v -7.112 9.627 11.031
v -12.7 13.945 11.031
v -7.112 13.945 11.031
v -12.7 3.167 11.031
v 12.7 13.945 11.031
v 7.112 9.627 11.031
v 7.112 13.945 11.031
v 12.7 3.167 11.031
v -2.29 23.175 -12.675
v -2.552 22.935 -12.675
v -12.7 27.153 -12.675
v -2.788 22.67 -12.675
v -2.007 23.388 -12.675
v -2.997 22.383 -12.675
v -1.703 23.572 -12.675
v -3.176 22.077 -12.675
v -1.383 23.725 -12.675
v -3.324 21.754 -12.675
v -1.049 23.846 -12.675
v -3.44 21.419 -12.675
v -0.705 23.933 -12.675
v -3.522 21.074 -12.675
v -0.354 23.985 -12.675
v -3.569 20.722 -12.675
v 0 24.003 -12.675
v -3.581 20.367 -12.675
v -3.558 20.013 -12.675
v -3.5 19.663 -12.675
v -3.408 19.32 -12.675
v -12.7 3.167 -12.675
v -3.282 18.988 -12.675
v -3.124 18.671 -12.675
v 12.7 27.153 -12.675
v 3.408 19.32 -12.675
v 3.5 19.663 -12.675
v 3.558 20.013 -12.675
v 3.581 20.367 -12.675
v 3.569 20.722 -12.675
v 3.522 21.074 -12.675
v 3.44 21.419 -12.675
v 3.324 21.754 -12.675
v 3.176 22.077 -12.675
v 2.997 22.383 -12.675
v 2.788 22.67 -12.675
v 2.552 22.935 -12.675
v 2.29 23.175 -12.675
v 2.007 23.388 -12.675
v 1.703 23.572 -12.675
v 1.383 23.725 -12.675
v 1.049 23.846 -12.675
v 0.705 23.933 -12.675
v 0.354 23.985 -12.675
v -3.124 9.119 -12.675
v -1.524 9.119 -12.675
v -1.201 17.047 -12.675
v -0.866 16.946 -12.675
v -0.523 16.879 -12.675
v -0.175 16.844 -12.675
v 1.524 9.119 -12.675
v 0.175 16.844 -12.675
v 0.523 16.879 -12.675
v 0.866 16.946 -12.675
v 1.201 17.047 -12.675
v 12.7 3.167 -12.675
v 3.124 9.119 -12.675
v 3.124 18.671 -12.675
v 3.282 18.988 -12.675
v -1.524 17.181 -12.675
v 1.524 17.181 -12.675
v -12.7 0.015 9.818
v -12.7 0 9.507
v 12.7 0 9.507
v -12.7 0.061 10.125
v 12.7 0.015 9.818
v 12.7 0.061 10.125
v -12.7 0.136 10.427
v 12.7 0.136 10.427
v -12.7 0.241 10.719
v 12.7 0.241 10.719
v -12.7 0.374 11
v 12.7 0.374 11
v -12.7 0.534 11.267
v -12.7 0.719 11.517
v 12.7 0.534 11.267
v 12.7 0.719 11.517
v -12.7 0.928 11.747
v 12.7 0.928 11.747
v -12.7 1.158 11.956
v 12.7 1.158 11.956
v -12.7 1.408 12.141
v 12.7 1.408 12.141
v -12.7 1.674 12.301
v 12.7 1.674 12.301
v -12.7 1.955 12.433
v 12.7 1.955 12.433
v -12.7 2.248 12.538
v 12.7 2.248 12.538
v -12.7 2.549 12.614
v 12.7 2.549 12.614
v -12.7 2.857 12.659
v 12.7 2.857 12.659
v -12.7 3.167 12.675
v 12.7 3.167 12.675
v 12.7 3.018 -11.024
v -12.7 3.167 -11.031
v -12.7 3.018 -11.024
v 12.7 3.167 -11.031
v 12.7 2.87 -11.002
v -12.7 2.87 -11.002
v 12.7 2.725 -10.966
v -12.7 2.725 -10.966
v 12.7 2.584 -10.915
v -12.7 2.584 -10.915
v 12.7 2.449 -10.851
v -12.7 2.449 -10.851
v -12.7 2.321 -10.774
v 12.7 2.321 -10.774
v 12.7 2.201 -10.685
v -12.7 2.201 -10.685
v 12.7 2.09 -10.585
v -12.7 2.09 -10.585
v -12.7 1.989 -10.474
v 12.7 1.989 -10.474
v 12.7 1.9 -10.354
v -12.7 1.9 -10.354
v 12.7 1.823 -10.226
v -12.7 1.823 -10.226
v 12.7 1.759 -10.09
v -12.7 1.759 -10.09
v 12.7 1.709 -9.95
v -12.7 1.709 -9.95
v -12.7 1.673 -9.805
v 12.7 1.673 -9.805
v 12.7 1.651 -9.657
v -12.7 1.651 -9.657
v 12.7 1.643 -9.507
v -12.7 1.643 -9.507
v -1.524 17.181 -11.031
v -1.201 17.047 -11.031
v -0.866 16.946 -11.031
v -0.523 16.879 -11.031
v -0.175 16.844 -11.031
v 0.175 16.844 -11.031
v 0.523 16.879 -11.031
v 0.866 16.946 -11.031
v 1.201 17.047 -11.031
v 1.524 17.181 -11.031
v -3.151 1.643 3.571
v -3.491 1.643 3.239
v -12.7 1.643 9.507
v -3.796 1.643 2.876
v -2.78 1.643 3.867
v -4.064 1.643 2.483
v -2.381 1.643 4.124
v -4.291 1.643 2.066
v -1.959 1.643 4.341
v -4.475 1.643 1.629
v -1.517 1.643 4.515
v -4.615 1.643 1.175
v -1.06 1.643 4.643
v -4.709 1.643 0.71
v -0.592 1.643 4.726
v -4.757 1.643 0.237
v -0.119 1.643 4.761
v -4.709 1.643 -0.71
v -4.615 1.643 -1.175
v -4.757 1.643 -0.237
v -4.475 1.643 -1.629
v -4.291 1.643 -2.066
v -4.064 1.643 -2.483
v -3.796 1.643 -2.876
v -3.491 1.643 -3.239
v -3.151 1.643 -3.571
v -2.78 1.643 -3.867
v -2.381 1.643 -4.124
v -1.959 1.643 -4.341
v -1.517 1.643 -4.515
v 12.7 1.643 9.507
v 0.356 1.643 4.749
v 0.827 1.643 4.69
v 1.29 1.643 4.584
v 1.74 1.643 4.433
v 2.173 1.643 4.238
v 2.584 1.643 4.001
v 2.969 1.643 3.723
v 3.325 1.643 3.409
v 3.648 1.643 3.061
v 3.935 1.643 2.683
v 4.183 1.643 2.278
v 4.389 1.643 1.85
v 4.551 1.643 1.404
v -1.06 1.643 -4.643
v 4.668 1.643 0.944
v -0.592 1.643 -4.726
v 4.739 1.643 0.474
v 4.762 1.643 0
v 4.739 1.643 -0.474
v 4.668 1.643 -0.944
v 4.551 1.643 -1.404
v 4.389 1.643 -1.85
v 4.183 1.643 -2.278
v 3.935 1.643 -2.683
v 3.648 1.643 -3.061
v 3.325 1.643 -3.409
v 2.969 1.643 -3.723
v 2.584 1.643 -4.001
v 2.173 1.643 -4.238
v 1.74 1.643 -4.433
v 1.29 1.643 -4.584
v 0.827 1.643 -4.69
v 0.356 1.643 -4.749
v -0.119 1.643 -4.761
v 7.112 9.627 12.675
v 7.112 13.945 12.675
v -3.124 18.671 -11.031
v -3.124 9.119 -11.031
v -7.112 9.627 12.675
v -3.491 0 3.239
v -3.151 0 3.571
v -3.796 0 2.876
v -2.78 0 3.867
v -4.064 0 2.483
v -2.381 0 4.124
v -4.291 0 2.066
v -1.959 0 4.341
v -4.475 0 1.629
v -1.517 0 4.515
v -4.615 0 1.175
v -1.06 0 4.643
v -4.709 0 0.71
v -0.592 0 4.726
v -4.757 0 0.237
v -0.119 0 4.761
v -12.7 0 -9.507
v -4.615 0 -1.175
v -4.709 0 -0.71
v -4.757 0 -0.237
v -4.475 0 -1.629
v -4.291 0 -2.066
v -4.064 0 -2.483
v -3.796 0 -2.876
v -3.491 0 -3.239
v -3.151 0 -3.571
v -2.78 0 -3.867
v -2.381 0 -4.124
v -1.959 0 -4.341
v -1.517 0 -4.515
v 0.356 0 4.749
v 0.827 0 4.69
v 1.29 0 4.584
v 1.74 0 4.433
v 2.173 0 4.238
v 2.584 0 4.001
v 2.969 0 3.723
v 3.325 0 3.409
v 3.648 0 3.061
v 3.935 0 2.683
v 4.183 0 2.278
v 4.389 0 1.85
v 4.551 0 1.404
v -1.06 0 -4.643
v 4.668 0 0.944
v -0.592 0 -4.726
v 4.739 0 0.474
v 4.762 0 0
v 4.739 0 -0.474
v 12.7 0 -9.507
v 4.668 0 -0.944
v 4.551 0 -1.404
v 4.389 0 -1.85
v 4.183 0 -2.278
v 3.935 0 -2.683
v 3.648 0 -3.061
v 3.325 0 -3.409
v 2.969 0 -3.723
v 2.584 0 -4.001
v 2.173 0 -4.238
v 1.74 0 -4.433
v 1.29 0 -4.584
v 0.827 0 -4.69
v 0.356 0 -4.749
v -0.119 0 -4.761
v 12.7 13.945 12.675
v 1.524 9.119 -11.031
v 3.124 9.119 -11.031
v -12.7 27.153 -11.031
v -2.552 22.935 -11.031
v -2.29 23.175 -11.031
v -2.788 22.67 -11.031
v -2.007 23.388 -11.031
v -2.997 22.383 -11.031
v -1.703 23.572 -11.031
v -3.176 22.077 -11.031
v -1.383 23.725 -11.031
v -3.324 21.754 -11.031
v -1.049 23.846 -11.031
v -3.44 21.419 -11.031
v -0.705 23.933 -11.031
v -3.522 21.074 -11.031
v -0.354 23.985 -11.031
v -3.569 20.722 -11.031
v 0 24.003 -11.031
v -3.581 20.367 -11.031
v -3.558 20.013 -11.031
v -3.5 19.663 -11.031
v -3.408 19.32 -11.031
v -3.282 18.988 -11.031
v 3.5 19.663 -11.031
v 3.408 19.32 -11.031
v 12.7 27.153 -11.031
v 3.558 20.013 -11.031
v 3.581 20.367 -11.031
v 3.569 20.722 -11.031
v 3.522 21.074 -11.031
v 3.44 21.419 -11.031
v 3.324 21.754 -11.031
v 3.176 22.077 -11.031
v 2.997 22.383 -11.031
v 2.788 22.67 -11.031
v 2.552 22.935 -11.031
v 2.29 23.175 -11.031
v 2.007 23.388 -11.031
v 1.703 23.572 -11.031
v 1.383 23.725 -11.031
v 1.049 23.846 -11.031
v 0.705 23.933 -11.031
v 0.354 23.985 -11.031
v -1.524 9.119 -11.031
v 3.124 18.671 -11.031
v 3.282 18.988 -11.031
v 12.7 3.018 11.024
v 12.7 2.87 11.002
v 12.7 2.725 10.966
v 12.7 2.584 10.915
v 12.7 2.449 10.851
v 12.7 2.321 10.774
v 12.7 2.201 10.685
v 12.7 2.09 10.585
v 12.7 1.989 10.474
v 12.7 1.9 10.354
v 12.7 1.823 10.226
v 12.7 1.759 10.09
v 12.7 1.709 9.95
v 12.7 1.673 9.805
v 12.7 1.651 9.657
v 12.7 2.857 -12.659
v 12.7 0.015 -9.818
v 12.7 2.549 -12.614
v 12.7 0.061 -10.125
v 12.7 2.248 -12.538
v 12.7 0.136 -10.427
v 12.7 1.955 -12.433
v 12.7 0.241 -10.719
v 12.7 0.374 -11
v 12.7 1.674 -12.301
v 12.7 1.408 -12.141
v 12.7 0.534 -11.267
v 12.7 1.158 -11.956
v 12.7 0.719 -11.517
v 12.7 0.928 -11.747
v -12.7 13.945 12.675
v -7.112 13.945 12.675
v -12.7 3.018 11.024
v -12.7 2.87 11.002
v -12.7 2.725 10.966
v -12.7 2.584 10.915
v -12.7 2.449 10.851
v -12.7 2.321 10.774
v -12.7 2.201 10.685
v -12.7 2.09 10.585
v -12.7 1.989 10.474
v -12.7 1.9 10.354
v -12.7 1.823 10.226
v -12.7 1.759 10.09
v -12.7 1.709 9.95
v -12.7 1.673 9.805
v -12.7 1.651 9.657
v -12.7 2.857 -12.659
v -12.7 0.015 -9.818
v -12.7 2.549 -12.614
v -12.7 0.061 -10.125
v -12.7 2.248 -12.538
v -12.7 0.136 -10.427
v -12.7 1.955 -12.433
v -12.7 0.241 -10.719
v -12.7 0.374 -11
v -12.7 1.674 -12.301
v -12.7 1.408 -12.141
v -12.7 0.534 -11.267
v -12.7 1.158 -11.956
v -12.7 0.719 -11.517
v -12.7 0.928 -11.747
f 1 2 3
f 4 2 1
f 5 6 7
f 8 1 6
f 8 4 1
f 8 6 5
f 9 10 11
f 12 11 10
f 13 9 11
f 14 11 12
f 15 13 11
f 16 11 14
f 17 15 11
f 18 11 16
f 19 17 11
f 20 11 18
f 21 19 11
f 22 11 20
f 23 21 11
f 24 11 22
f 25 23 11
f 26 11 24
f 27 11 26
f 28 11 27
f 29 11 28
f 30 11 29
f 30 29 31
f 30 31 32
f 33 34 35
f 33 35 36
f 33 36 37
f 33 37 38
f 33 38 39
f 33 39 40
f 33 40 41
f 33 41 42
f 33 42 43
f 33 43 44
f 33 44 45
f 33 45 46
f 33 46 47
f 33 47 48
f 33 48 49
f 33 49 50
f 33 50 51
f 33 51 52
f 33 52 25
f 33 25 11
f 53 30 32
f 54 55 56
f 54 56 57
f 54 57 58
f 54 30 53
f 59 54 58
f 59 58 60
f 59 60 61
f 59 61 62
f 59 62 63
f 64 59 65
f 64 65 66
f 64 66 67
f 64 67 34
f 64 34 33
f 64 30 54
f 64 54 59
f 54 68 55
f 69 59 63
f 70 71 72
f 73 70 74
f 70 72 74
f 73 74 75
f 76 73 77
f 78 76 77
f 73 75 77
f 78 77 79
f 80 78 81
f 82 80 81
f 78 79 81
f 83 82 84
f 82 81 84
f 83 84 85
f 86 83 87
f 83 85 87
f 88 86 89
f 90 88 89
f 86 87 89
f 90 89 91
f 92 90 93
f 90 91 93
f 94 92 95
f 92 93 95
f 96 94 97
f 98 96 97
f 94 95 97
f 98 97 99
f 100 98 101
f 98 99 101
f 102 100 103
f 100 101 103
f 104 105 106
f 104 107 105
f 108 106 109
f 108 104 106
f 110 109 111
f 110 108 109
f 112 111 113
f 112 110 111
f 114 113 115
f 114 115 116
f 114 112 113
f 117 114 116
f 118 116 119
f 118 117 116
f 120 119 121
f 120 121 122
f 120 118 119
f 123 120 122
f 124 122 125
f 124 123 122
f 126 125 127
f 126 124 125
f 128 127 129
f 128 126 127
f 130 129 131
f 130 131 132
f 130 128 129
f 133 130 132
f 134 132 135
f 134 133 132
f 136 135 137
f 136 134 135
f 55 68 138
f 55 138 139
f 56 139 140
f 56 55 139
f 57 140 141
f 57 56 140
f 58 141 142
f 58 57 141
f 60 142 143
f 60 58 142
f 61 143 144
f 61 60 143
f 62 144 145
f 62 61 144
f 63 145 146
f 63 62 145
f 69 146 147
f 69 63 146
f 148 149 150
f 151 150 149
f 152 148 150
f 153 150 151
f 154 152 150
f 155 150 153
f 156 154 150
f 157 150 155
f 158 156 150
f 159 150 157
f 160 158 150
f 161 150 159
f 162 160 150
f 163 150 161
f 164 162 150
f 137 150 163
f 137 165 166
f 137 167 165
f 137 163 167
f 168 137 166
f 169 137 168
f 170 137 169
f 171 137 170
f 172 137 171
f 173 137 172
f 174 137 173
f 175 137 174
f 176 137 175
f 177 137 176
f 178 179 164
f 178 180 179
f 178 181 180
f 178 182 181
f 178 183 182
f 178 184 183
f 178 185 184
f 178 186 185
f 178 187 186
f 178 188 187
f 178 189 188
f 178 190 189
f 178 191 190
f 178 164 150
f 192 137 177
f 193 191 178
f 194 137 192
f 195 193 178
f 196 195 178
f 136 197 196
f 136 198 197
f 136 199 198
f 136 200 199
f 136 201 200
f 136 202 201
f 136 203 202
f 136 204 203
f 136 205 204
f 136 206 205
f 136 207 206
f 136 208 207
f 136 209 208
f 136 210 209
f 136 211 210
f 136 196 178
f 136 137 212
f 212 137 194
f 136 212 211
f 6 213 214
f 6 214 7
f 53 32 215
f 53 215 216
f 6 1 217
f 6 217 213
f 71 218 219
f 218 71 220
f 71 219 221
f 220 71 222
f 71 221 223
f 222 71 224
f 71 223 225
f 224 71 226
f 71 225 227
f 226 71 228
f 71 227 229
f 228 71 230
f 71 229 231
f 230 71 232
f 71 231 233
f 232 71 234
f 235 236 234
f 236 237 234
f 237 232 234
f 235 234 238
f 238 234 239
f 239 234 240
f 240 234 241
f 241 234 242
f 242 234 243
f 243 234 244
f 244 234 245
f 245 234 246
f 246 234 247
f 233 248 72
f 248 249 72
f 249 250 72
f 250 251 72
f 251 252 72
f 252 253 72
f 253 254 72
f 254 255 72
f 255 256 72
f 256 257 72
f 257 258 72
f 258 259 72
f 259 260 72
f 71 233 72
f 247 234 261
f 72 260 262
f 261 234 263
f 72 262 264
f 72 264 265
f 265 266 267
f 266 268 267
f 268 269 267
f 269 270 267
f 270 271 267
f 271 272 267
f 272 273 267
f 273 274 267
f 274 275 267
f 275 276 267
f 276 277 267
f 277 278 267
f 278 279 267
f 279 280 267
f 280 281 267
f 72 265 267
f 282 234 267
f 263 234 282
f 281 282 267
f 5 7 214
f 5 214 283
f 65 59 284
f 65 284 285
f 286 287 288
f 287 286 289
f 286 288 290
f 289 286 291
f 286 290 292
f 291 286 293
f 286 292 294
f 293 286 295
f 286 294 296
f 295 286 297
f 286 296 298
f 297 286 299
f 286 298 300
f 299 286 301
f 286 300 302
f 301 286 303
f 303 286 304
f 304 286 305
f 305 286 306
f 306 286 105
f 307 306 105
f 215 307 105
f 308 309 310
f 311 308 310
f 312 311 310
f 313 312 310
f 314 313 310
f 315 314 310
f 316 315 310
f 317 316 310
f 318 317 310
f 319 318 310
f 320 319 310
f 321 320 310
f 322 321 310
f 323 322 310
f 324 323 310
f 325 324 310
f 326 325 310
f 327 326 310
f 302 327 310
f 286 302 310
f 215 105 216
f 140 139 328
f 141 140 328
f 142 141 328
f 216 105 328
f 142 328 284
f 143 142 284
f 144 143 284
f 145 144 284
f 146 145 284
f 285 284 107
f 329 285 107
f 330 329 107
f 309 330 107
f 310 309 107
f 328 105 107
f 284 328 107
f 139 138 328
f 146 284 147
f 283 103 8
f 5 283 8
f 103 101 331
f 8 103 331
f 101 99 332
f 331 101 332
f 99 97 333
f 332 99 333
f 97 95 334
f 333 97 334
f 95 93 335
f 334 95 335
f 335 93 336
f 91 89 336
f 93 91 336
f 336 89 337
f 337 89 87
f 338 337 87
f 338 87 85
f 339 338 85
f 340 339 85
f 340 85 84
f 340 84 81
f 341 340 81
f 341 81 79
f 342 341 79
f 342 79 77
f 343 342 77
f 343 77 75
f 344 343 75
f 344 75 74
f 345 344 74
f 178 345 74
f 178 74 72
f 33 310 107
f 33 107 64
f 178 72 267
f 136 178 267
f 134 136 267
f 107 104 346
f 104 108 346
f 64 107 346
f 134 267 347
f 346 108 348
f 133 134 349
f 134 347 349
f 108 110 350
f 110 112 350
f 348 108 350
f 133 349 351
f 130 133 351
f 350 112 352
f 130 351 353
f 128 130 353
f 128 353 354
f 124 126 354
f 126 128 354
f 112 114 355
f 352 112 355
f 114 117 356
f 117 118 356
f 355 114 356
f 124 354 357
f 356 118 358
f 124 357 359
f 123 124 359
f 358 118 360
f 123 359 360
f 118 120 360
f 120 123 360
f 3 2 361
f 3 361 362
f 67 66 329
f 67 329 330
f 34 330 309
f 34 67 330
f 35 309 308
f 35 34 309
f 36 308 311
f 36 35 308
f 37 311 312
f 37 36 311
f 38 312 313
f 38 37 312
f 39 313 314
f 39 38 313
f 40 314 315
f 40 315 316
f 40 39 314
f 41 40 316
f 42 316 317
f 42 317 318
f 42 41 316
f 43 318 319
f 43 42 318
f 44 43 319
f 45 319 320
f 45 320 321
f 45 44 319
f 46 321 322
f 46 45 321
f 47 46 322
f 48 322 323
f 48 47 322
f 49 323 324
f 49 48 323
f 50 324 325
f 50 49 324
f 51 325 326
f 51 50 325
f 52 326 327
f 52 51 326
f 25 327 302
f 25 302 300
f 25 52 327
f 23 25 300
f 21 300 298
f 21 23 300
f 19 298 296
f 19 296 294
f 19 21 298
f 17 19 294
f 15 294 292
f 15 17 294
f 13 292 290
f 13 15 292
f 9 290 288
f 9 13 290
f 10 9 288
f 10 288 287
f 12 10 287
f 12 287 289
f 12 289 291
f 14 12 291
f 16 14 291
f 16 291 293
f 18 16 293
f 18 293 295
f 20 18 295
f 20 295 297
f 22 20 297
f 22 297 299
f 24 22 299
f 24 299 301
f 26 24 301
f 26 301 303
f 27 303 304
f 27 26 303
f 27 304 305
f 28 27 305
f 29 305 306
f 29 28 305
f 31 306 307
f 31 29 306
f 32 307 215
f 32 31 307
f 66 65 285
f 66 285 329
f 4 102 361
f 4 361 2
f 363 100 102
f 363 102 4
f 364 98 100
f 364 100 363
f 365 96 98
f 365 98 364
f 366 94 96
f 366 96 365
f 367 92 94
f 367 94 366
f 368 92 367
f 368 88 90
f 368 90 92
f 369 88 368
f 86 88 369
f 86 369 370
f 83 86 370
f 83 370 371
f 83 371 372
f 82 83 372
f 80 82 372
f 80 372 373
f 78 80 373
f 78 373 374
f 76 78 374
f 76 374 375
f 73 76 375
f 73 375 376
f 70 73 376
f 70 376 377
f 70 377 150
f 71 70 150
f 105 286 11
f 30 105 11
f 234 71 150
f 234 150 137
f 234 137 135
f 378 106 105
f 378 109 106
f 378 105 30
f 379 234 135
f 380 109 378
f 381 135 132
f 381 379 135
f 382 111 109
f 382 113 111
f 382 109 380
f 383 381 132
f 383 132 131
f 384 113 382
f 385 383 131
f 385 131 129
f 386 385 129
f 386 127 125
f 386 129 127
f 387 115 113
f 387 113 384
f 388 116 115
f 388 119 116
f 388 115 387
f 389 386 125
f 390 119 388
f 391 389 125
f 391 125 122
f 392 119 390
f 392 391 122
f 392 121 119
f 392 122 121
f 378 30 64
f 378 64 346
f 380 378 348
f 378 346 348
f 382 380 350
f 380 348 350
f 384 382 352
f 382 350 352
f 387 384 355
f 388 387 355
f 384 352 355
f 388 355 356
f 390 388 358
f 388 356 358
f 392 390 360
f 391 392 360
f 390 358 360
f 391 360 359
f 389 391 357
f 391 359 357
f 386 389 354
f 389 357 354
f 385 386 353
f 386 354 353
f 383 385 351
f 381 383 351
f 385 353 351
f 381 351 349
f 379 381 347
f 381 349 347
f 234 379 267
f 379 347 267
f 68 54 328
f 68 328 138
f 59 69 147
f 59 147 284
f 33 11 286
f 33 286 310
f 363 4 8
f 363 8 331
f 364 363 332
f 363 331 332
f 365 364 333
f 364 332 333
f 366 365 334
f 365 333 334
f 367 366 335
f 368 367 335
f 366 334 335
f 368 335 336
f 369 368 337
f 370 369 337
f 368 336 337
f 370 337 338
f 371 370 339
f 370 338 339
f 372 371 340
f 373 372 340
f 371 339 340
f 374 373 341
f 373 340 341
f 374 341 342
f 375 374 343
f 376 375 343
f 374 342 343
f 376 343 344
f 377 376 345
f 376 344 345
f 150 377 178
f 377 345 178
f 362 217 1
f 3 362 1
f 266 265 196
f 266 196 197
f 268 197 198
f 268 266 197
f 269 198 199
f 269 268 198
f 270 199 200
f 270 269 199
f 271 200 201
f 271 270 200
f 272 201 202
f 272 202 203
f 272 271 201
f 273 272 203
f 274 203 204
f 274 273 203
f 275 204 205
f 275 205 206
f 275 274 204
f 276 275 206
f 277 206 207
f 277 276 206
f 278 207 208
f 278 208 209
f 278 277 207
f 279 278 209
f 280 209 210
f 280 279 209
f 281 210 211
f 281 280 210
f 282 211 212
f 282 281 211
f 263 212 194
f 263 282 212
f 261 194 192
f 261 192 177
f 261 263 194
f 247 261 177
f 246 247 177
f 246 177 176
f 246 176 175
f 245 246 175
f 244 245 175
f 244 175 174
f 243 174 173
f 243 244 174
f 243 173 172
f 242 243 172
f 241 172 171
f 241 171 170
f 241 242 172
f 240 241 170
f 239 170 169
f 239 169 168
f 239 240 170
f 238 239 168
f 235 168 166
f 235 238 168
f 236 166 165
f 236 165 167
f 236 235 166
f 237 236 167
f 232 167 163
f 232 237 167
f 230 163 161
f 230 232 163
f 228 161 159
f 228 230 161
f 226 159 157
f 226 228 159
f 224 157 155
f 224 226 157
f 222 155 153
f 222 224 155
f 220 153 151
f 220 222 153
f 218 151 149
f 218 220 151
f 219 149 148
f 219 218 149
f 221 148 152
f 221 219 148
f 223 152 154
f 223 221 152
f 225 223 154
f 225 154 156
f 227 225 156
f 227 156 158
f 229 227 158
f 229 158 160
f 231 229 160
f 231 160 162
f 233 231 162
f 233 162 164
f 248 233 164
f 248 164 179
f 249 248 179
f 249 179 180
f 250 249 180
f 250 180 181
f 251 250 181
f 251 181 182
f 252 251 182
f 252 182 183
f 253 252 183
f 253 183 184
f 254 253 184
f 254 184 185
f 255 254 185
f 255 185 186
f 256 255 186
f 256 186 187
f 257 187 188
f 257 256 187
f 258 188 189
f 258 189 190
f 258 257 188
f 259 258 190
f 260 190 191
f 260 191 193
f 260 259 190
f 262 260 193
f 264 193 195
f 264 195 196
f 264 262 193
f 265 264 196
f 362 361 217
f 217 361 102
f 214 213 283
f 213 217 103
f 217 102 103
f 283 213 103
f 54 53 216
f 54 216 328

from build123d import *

# Parameters (mm, degrees)
SKETCH1_W           = 25.4
SKETCH1_H           = 25.3492
SKETCH1_R           = 4.7625
BOSS_EXTRUDE1_DEPTH = 1.64338
SKETCH2_W           = 25.4
SKETCH2_H           = 1.64338
BOSS_EXTRUDE2_DEPTH = 7.98322
SKETCH3_W           = 5.588
SKETCH3_H           = 1.64338
BOSS_EXTRUDE3_DEPTH = 4.318
SKETCH4_W           = 25.4
SKETCH4_H           = 1.64338
BOSS_EXTRUDE4_DEPTH = 25.50922
CUT_EXTRUDE1_DEPTH  = 1.64338
FILLET1_R           = 1.524
FILLET2_R           = 3.16738


with BuildPart() as part:
    # Sketch1 → Boss-Extrude1 (new body)
    with BuildSketch(Plane(origin=(0, 0, 0), x_dir=(1, 0, 0), z_dir=(0, 1, 0))):
        Rectangle(SKETCH1_W, SKETCH1_H)
        Circle(SKETCH1_R, mode=Mode.SUBTRACT)
    extrude(amount=BOSS_EXTRUDE1_DEPTH)

    # Sketch2 → Boss-Extrude2 (add)
    with BuildSketch(Plane(origin=(0, 1.64338, 0), x_dir=(1, 0, 0), z_dir=(0, 1, 0))):
        with Locations((0, -11.85291)):
            Rectangle(SKETCH2_W, SKETCH2_H)
    extrude(amount=BOSS_EXTRUDE2_DEPTH)

    # Sketch3 → Boss-Extrude3 (add)
    with BuildSketch(Plane(origin=(0, 9.6266, 0), x_dir=(1, 0, 0), z_dir=(0, 1, 0))):
        with Locations((-9.906, -11.85291)):
            Rectangle(SKETCH3_W, SKETCH3_H)
        with Locations((9.906, -11.85291)):
            Rectangle(SKETCH3_W, SKETCH3_H)
    extrude(amount=BOSS_EXTRUDE3_DEPTH)

    # Sketch4 → Boss-Extrude4 (add)
    with BuildSketch(Plane(origin=(0, 1.64338, 0), x_dir=(1, 0, 0), z_dir=(0, 1, 0))):
        with Locations((0, 11.85291)):
            Rectangle(SKETCH4_W, SKETCH4_H)
    extrude(amount=BOSS_EXTRUDE4_DEPTH)

    # Sketch5 → Cut-Extrude1 (cut)
    with BuildSketch(Plane(origin=(0, 0, -12.6746), x_dir=(-1, 0, 0), z_dir=(0, 0, -1))):
        with BuildLine():
            Line((-3.1242, 9.1186), (-3.1242, 18.670657305))
            ThreePointArc((-3.1242, 18.670657305), (0, 24.003), (3.1242, 18.670657305))
            Line((3.1242, 18.670657305), (3.1242, 9.1186))
            Line((3.1242, 9.1186), (1.524, 9.1186))
            Line((1.524, 9.1186), (1.524, 17.180635644))
            ThreePointArc((1.524, 17.180635644), (0, 16.8402), (-1.524, 17.180635644))
            Line((-1.524, 17.180635644), (-1.524, 9.1186))
            Line((-1.524, 9.1186), (-3.1242, 9.1186))
        make_face()
    extrude(amount=-CUT_EXTRUDE1_DEPTH, mode=Mode.SUBTRACT)

    # Fillet1
    fillet1_edges = [part.edges().sort_by_distance(p)[0] for p in [
        (0, 1.64338, 11.03122),
        (0, 1.64338, -11.03122),
    ]]
    fillet(fillet1_edges, radius=FILLET1_R)

    # Fillet2
    fillet2_edges = [part.edges().sort_by_distance(p)[0] for p in [
        (0, 0, -12.6746),
        (0, 0, 12.6746),
    ]]
    fillet(fillet2_edges, radius=FILLET2_R)


solid = part.part
